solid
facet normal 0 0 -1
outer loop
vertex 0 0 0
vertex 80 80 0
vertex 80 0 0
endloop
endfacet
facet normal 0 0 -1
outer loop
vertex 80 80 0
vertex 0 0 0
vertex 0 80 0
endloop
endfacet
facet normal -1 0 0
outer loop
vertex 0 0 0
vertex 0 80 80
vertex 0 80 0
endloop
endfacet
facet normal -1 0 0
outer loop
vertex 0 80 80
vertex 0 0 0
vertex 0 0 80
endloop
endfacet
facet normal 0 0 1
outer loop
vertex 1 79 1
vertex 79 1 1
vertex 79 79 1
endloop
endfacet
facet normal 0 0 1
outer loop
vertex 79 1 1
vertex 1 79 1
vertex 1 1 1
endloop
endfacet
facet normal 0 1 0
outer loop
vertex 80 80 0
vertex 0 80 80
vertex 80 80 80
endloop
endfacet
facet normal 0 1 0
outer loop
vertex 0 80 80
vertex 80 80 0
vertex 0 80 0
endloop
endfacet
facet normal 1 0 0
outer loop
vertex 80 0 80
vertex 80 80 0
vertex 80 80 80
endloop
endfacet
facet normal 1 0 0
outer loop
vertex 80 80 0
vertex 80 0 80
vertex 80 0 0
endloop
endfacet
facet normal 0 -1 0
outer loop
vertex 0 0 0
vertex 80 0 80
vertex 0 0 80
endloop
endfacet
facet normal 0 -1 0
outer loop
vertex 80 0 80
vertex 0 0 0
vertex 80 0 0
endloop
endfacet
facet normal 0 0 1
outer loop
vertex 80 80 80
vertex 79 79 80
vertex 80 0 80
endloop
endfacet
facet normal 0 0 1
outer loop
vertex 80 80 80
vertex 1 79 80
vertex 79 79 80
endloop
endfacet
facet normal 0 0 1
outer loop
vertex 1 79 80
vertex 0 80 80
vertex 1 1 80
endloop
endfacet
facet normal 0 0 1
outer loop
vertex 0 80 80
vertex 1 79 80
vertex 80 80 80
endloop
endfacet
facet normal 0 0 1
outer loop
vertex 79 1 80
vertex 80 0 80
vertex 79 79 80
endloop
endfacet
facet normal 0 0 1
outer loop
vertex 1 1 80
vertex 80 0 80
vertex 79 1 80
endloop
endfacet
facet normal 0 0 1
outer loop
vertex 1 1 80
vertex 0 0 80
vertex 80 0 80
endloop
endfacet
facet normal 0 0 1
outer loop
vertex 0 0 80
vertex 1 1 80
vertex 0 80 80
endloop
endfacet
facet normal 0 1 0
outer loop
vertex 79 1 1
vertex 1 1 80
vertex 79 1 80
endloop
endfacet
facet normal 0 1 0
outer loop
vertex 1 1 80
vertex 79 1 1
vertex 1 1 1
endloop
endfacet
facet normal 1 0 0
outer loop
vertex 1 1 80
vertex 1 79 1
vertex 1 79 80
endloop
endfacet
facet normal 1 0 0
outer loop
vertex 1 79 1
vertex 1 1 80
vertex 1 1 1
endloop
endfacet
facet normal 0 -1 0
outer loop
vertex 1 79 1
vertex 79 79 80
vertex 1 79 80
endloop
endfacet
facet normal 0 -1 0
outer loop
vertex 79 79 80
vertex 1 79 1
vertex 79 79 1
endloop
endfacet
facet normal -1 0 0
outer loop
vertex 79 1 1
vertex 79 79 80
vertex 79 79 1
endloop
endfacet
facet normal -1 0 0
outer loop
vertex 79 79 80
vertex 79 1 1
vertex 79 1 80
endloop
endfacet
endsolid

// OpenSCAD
edge = 80;
width = 1;

union(){
    linear_extrude(height = width)
        square([edge, edge], [0,0]);
    linear_extrude(height = edge)
        square([edge, width]);
    linear_extrude(height = edge)
        square([width, edge]);
    translate([0, edge-width, 0])
        linear_extrude(height = edge)
            square([edge, width]);
    translate([edge-width, 0, 0])
        linear_extrude(height = edge)
            square([width, edge]);
}
